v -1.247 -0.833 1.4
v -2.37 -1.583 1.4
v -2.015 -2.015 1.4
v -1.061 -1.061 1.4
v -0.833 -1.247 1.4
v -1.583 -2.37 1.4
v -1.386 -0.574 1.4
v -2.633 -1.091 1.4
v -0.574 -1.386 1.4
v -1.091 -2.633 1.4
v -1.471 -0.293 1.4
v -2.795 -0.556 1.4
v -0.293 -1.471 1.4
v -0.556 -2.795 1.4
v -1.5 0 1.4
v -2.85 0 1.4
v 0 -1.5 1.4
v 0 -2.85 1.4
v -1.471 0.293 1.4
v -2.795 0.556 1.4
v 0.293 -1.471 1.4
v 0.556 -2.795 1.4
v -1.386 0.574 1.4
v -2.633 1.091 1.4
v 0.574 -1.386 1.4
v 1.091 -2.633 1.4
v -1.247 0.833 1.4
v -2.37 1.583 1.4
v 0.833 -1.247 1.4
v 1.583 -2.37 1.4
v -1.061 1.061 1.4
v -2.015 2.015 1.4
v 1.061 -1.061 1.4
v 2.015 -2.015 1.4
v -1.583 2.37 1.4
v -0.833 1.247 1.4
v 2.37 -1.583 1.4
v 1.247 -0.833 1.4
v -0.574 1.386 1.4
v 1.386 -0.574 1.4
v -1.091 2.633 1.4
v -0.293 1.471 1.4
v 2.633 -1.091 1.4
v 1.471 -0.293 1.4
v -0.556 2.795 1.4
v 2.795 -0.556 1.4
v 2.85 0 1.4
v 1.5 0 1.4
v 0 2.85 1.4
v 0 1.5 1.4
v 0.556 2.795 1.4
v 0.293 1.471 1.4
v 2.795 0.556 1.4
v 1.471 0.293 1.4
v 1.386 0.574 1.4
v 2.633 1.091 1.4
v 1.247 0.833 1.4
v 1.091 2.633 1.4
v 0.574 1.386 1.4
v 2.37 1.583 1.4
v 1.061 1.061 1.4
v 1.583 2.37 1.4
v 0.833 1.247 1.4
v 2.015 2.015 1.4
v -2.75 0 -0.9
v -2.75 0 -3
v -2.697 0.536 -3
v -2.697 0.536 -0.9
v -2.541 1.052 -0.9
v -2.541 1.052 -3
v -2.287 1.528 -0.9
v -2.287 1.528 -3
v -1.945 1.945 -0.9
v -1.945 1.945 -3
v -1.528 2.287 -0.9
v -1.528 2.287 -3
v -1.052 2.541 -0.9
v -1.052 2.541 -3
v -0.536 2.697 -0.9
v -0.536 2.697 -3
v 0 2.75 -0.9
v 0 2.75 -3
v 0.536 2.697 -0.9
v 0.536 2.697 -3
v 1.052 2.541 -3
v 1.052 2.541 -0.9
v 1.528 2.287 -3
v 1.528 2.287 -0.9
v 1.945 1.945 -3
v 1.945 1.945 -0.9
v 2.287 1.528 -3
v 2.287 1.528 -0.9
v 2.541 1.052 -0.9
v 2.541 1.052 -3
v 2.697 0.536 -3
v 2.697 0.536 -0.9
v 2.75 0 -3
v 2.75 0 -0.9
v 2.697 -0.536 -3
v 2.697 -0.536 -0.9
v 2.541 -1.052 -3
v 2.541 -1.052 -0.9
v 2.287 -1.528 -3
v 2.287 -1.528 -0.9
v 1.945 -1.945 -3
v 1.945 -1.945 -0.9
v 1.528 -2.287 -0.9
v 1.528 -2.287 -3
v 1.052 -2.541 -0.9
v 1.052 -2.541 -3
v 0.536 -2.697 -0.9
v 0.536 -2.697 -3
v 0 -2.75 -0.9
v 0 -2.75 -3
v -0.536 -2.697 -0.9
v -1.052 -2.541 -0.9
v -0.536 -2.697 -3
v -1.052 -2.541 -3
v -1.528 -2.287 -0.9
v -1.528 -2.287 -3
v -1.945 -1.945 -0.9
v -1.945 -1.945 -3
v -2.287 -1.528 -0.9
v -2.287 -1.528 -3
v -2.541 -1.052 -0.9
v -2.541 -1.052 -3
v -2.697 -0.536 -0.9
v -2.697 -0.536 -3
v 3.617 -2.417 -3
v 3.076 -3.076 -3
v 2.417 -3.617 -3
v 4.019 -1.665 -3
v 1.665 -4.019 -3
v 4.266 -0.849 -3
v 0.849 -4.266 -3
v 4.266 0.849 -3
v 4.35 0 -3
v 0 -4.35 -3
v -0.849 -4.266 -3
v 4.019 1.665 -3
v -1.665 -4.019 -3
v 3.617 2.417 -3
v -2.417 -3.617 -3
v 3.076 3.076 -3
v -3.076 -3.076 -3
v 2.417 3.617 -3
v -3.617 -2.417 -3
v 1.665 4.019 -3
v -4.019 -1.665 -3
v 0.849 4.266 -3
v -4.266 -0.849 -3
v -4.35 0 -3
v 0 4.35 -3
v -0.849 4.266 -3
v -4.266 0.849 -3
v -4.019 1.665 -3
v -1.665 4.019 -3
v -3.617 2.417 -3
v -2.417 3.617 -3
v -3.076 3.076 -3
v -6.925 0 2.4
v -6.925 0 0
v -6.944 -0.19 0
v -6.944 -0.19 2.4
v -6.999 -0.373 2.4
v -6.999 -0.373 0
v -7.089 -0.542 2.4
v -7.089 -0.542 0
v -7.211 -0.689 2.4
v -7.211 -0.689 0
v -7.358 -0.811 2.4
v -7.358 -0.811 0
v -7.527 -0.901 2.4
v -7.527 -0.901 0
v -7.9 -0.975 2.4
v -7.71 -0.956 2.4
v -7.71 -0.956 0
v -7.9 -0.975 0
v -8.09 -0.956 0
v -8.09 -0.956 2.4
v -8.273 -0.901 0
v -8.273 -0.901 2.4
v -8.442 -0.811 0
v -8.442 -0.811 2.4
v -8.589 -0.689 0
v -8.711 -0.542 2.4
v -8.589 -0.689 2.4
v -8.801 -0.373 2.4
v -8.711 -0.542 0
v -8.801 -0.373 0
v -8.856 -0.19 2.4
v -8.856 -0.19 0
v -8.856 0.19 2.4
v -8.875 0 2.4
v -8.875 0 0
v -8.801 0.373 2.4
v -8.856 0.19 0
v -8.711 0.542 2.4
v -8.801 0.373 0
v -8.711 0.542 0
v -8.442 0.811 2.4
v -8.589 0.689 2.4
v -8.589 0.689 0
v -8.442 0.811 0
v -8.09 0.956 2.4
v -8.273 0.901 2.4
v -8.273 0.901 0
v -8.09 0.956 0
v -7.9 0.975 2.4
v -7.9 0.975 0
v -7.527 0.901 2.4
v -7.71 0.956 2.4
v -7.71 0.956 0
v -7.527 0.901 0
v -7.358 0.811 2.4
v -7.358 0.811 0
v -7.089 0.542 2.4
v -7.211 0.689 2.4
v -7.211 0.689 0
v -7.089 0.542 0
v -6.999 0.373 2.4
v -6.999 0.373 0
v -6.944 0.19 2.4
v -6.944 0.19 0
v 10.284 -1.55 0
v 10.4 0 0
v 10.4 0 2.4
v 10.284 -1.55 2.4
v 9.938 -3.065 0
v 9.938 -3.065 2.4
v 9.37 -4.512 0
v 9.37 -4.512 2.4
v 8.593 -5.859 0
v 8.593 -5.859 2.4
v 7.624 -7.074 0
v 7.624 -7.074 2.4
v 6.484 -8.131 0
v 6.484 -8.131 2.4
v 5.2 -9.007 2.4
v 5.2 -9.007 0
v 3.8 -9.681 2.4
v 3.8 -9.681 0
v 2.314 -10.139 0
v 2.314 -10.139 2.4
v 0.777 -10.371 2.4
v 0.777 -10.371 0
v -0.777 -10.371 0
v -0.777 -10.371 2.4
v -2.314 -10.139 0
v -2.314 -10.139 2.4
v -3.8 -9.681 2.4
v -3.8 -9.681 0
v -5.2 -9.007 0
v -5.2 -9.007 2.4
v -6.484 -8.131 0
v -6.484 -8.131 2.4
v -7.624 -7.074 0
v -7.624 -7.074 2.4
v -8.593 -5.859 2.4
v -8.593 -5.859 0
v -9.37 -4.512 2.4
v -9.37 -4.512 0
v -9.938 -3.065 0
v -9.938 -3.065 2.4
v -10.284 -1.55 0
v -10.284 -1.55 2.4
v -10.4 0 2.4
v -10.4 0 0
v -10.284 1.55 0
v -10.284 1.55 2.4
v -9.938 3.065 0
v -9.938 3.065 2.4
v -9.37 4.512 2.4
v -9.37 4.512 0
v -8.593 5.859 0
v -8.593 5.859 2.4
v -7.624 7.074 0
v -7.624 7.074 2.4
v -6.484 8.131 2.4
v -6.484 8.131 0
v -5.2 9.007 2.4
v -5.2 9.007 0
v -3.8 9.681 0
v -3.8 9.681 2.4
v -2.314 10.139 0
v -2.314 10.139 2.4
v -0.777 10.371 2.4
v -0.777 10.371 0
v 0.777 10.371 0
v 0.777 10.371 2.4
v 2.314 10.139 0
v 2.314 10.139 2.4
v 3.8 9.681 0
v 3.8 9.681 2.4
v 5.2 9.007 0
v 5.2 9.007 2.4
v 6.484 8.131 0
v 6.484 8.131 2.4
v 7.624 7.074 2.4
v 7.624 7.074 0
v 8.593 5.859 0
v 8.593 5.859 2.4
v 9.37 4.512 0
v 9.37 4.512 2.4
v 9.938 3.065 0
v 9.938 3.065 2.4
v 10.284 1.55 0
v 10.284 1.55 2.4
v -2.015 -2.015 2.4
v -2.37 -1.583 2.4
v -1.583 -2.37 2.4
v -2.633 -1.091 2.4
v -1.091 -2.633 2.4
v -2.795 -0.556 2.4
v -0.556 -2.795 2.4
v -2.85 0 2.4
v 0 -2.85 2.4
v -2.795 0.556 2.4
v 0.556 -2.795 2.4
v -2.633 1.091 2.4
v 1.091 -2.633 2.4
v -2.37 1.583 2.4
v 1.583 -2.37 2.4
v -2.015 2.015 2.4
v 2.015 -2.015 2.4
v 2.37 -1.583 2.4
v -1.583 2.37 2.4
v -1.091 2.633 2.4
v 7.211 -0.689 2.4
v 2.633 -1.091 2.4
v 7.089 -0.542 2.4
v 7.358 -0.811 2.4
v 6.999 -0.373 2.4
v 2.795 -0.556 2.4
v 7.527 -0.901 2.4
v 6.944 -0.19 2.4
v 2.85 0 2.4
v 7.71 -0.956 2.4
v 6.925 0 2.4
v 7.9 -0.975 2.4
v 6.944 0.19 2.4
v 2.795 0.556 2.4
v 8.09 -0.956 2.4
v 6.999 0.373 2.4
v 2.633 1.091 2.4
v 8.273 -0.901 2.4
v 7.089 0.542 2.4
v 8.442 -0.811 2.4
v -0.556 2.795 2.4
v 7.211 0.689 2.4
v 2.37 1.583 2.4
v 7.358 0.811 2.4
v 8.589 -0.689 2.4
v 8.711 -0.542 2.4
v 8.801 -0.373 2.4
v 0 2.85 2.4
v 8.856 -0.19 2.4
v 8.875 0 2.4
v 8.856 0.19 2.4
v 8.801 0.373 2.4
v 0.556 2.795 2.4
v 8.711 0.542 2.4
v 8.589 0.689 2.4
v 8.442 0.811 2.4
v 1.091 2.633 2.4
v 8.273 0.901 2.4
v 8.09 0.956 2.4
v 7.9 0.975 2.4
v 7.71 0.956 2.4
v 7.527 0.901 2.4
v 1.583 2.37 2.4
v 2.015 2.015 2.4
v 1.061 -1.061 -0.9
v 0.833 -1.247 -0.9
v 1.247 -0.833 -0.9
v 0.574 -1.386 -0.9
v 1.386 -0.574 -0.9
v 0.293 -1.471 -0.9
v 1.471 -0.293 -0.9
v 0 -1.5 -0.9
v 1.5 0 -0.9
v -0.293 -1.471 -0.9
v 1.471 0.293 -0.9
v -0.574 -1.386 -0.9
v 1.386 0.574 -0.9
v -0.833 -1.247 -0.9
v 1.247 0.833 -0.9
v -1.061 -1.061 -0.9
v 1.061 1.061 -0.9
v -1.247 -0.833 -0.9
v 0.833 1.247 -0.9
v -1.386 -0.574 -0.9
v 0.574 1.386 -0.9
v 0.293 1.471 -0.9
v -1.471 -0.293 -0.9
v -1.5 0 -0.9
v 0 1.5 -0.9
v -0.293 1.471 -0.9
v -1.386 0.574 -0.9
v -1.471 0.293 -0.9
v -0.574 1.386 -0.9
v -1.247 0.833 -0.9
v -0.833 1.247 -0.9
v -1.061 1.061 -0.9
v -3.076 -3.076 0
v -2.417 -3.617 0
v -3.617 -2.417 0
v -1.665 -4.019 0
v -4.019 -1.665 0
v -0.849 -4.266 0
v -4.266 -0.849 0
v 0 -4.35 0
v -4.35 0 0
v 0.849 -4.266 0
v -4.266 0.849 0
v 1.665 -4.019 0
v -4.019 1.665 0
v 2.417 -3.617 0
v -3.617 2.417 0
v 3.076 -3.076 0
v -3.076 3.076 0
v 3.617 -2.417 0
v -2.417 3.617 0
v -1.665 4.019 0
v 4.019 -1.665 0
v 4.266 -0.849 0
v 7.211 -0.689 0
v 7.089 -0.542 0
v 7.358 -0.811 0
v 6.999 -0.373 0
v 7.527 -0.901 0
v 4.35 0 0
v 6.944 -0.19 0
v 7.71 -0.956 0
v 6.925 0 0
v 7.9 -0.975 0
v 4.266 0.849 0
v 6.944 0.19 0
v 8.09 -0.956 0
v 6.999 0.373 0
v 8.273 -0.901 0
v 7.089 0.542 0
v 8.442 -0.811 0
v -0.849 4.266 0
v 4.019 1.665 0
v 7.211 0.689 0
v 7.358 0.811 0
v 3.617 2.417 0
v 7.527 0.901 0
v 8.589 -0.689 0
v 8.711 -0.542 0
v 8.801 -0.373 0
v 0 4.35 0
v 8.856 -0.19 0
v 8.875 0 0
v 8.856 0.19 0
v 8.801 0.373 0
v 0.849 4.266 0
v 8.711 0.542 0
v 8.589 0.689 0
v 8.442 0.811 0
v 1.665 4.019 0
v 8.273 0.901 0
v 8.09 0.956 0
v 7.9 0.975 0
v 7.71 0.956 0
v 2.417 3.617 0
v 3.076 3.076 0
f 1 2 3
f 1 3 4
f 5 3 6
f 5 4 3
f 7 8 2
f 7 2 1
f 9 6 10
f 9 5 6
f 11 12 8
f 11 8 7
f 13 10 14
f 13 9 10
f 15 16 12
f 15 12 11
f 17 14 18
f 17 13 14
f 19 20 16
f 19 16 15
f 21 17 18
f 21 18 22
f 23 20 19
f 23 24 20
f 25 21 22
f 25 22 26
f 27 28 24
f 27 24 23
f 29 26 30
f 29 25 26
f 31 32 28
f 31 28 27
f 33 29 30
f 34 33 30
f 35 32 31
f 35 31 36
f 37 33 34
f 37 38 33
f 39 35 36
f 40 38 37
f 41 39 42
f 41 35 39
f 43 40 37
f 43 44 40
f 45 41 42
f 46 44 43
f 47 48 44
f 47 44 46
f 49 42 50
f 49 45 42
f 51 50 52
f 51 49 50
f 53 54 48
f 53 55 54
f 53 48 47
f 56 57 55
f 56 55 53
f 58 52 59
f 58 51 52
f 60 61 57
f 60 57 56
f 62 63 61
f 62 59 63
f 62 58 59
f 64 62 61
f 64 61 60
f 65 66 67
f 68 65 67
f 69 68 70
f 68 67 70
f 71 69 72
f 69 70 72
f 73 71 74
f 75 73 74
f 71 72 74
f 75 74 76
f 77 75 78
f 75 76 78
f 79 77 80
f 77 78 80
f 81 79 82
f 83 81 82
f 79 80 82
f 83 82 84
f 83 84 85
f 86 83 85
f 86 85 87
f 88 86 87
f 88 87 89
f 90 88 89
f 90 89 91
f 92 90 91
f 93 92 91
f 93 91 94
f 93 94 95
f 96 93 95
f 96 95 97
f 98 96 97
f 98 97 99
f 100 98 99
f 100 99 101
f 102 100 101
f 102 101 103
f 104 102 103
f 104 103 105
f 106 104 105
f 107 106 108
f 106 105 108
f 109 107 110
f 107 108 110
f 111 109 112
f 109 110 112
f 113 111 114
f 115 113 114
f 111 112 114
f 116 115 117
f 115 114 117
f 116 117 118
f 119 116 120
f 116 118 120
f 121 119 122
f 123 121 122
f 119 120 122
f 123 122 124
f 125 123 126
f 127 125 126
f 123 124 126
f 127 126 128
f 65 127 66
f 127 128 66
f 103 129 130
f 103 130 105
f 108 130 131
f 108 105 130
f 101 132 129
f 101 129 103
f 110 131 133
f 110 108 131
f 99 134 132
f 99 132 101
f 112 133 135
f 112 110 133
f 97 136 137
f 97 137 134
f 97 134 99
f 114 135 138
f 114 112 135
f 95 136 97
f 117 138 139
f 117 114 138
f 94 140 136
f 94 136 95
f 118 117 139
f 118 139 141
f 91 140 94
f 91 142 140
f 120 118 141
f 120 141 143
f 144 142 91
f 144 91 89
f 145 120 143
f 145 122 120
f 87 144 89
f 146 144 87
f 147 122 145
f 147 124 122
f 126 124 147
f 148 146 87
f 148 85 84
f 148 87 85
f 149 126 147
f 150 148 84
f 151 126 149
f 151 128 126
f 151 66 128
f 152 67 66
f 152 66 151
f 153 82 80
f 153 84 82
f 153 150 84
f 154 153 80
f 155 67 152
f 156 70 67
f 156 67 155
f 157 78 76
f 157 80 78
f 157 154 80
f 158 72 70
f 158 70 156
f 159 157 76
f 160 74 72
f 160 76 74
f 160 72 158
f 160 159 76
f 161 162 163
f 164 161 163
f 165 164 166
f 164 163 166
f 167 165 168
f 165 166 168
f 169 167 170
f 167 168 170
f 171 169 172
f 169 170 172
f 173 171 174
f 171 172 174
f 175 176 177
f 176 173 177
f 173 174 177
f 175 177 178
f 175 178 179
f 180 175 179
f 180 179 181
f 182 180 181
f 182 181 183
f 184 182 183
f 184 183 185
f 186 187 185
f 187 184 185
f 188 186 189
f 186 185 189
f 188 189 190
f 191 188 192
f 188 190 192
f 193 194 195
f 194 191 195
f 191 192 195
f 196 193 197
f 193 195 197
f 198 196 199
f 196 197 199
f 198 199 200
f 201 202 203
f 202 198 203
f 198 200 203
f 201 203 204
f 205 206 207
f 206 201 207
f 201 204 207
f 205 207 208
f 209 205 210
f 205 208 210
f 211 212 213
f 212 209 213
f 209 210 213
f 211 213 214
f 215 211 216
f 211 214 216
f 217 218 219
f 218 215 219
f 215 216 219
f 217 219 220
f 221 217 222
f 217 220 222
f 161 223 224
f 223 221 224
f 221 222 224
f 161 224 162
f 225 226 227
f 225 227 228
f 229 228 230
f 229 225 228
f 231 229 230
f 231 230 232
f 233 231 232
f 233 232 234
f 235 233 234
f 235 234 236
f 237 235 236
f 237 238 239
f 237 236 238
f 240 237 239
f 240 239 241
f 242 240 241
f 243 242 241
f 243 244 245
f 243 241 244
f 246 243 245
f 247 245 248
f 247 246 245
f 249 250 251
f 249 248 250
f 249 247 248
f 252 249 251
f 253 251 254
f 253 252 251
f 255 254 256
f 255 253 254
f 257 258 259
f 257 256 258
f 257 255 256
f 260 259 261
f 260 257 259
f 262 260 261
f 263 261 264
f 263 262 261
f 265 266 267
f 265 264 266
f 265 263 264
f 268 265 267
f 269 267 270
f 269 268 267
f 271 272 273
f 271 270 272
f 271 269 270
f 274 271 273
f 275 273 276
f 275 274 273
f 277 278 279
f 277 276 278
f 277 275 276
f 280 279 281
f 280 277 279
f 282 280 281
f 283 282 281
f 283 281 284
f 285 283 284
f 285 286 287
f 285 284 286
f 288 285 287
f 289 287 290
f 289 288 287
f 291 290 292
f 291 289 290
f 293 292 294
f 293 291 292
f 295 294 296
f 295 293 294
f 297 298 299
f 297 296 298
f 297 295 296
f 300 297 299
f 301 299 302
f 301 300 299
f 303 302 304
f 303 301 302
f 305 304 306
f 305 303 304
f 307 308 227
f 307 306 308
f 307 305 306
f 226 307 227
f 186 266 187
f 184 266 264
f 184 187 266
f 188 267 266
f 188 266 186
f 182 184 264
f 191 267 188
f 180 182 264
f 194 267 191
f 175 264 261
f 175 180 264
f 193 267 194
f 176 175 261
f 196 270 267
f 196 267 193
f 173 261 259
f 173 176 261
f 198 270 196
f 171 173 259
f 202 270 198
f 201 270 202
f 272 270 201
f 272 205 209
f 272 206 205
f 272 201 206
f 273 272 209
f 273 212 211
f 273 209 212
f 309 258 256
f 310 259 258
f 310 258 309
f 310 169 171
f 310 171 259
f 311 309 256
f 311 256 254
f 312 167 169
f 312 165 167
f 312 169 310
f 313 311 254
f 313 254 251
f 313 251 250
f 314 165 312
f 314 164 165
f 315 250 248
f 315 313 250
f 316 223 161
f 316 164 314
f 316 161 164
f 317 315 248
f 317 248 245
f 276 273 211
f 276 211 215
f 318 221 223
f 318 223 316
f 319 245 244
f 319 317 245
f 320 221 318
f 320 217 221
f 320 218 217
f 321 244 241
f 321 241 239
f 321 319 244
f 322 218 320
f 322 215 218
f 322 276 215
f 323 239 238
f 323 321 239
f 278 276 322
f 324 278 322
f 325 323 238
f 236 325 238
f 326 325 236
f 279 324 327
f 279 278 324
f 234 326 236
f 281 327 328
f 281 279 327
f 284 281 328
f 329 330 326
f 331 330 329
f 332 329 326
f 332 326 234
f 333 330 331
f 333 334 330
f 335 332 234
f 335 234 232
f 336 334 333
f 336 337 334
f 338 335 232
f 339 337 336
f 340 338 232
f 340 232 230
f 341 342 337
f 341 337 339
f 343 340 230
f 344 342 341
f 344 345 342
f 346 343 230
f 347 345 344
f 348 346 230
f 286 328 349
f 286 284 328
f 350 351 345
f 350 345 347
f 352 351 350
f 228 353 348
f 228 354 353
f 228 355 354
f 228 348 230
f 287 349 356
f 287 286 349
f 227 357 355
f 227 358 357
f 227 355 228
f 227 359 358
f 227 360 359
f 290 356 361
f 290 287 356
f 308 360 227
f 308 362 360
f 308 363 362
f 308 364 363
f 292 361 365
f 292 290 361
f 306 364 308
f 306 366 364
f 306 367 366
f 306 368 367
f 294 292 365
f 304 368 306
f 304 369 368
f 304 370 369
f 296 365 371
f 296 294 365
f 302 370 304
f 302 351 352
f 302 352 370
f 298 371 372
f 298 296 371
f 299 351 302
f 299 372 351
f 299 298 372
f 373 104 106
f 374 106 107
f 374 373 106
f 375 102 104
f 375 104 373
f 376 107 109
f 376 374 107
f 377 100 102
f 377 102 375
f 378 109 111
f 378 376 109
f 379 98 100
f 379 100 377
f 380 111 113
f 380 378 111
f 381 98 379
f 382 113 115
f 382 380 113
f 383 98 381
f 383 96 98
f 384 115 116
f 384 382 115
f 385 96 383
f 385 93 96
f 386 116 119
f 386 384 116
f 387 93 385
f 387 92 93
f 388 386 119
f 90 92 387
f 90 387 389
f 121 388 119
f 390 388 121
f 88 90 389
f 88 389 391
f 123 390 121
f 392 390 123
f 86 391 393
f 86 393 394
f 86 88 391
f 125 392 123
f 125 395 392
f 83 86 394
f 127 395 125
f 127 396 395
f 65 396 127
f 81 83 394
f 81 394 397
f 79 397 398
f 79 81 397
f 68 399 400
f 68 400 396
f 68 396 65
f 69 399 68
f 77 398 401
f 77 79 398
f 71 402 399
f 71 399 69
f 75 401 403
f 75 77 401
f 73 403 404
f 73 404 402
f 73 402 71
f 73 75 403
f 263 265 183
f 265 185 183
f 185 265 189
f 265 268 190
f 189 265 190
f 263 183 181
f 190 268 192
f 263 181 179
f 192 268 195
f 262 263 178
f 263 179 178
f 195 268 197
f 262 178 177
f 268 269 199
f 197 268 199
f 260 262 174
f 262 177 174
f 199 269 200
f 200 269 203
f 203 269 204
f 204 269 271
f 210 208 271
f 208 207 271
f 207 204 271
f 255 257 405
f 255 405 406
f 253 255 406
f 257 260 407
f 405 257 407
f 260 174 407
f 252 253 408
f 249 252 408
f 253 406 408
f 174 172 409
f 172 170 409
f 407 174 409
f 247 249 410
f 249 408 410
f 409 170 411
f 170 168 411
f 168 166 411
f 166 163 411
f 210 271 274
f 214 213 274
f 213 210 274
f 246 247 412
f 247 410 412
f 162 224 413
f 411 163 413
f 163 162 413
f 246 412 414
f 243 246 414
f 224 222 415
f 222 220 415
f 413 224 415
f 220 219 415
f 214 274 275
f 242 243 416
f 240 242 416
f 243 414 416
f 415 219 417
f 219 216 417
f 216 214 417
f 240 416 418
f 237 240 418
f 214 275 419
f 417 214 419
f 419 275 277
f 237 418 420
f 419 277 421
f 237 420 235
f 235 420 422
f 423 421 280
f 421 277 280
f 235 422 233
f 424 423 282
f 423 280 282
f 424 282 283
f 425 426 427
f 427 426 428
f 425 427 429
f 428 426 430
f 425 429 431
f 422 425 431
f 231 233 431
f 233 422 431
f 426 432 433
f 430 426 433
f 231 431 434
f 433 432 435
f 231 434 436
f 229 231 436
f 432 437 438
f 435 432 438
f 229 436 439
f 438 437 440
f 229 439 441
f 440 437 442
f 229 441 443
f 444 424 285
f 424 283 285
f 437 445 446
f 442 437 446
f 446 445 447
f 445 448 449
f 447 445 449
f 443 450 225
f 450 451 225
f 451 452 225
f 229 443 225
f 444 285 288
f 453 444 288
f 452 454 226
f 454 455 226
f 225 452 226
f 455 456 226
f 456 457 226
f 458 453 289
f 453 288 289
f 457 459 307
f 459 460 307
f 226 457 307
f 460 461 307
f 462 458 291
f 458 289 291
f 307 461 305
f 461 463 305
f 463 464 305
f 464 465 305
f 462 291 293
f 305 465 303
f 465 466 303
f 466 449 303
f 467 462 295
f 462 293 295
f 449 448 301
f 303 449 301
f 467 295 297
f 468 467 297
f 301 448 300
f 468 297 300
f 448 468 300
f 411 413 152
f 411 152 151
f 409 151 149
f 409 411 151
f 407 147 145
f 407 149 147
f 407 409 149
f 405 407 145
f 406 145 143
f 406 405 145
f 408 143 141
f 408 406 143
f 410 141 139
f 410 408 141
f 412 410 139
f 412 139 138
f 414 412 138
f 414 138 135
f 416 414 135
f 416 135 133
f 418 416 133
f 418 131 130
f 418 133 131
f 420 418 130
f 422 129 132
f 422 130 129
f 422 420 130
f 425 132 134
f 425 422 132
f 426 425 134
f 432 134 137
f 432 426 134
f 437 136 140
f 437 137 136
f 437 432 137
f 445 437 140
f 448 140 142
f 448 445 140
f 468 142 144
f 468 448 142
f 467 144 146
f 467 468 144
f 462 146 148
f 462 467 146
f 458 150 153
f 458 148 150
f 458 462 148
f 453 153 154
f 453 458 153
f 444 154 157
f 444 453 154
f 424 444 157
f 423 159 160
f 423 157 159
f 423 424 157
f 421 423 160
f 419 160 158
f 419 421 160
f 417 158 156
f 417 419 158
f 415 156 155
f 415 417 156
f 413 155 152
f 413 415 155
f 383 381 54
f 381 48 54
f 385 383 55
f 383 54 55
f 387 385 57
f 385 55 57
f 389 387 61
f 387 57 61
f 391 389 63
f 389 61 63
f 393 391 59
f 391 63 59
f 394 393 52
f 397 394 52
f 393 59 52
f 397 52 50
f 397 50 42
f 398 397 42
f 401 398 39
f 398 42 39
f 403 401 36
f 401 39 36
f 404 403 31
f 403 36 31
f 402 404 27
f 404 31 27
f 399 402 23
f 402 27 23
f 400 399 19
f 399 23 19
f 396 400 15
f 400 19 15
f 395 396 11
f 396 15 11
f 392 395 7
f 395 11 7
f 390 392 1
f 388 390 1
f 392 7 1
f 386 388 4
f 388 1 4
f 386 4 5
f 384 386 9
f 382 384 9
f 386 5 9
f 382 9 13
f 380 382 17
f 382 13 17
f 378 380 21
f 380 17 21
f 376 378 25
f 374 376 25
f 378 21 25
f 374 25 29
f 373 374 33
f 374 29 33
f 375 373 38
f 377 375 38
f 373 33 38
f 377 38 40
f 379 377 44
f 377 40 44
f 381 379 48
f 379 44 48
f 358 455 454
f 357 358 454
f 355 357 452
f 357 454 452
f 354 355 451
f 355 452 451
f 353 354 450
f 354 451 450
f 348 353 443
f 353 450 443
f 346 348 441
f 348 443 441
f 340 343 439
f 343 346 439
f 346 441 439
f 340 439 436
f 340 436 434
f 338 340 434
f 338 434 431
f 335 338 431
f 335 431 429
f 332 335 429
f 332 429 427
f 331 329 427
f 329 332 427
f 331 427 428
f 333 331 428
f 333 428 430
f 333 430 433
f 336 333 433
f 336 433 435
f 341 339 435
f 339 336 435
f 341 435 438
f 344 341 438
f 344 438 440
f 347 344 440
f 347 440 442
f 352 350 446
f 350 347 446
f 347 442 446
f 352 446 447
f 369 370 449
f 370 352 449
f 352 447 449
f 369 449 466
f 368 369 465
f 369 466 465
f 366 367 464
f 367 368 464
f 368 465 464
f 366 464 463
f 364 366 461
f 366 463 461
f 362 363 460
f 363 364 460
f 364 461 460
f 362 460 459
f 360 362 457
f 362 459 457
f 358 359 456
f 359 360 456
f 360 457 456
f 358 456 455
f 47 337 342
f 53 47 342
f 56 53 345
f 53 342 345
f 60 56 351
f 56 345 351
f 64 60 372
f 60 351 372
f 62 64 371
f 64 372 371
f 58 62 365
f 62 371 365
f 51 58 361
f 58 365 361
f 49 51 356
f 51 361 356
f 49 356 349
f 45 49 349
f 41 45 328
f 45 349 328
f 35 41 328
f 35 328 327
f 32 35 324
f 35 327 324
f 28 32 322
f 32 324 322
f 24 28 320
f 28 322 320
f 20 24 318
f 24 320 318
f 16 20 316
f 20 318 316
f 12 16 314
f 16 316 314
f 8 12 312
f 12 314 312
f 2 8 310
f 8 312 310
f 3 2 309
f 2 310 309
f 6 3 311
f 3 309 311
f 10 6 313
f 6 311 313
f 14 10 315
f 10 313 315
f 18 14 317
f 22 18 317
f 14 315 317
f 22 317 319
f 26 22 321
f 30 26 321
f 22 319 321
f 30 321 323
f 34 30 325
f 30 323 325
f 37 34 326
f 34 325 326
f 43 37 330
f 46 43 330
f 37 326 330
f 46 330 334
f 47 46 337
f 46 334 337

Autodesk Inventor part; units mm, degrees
ref_plane "YZ Plane" through (0, 0, 0) normal (1, 0, 0) x (0, 1, 0)
ref_plane "XZ Plane" through (0, 0, 0) normal (0, 1, 0) x (-1, 0, 0)
ref_plane "XY Plane" through (0, 0, 0) normal (0, 0, 1) x (1, 0, 0)
sketch "Sketch3" plane through (0, 0, 0) normal (0, 0, 1) x (1, 0, 0)
  circle A0 centre (0, 0) radius 10.4
  circle A1 centre (-7.9, 0) radius 0.975 projected
  circle A2 centre (7.9, 0) radius 0.975 projected
  circle A3 centre (-7.9, 0) radius 0.975
  circle A4 centre (7.9, 0) radius 0.975
  dimension "d0" = 20.8
extrude "Extrusion1" add sketch "Sketch3" along normal blind 2.4
sketch "Sketch4" plane through (0, 0, 0) normal (0, 0, -1) x (-1, 0, 0)
  circle A0 centre (0, 0) radius 4.35
  circle A1 centre (0, 0) radius 2.7
  dimension "d3" = 8.7
  dimension "d4" = 5.4
extrude "Extrusion2" add sketch "Sketch4" along normal blind 3 contours A0 | A1
sketch "Sketch5" plane through (0, 0, -3) normal (0, 0, -1) x (-1, 0, 0)
  circle A0 centre (0, 0) radius 2.75
  dimension "d7" = 5.5
extrude "Extrusion3" cut sketch "Sketch5" against normal blind 2.1
sketch "Sketch6" plane through (0, 0, 2.4) normal (0, 0, 1) x (1, 0, 0)
  circle A0 centre (0, 0) radius 2.85
  dimension "d10" = 5.7
extrude "Extrusion4" cut sketch "Sketch6" against normal blind 1
sketch "Sketch7" plane through (0, 0, 1.4) normal (0, 0, 1) x (1, 0, 0)
  circle A0 centre (0, 0) radius 4.35 projected
  circle A1 centre (0, 0) radius 1.5
  dimension "d13" = 3
extrude "Extrusion5" cut sketch "Sketch7" against normal through all contours A1
properties part number "Circulo_Inferior"
